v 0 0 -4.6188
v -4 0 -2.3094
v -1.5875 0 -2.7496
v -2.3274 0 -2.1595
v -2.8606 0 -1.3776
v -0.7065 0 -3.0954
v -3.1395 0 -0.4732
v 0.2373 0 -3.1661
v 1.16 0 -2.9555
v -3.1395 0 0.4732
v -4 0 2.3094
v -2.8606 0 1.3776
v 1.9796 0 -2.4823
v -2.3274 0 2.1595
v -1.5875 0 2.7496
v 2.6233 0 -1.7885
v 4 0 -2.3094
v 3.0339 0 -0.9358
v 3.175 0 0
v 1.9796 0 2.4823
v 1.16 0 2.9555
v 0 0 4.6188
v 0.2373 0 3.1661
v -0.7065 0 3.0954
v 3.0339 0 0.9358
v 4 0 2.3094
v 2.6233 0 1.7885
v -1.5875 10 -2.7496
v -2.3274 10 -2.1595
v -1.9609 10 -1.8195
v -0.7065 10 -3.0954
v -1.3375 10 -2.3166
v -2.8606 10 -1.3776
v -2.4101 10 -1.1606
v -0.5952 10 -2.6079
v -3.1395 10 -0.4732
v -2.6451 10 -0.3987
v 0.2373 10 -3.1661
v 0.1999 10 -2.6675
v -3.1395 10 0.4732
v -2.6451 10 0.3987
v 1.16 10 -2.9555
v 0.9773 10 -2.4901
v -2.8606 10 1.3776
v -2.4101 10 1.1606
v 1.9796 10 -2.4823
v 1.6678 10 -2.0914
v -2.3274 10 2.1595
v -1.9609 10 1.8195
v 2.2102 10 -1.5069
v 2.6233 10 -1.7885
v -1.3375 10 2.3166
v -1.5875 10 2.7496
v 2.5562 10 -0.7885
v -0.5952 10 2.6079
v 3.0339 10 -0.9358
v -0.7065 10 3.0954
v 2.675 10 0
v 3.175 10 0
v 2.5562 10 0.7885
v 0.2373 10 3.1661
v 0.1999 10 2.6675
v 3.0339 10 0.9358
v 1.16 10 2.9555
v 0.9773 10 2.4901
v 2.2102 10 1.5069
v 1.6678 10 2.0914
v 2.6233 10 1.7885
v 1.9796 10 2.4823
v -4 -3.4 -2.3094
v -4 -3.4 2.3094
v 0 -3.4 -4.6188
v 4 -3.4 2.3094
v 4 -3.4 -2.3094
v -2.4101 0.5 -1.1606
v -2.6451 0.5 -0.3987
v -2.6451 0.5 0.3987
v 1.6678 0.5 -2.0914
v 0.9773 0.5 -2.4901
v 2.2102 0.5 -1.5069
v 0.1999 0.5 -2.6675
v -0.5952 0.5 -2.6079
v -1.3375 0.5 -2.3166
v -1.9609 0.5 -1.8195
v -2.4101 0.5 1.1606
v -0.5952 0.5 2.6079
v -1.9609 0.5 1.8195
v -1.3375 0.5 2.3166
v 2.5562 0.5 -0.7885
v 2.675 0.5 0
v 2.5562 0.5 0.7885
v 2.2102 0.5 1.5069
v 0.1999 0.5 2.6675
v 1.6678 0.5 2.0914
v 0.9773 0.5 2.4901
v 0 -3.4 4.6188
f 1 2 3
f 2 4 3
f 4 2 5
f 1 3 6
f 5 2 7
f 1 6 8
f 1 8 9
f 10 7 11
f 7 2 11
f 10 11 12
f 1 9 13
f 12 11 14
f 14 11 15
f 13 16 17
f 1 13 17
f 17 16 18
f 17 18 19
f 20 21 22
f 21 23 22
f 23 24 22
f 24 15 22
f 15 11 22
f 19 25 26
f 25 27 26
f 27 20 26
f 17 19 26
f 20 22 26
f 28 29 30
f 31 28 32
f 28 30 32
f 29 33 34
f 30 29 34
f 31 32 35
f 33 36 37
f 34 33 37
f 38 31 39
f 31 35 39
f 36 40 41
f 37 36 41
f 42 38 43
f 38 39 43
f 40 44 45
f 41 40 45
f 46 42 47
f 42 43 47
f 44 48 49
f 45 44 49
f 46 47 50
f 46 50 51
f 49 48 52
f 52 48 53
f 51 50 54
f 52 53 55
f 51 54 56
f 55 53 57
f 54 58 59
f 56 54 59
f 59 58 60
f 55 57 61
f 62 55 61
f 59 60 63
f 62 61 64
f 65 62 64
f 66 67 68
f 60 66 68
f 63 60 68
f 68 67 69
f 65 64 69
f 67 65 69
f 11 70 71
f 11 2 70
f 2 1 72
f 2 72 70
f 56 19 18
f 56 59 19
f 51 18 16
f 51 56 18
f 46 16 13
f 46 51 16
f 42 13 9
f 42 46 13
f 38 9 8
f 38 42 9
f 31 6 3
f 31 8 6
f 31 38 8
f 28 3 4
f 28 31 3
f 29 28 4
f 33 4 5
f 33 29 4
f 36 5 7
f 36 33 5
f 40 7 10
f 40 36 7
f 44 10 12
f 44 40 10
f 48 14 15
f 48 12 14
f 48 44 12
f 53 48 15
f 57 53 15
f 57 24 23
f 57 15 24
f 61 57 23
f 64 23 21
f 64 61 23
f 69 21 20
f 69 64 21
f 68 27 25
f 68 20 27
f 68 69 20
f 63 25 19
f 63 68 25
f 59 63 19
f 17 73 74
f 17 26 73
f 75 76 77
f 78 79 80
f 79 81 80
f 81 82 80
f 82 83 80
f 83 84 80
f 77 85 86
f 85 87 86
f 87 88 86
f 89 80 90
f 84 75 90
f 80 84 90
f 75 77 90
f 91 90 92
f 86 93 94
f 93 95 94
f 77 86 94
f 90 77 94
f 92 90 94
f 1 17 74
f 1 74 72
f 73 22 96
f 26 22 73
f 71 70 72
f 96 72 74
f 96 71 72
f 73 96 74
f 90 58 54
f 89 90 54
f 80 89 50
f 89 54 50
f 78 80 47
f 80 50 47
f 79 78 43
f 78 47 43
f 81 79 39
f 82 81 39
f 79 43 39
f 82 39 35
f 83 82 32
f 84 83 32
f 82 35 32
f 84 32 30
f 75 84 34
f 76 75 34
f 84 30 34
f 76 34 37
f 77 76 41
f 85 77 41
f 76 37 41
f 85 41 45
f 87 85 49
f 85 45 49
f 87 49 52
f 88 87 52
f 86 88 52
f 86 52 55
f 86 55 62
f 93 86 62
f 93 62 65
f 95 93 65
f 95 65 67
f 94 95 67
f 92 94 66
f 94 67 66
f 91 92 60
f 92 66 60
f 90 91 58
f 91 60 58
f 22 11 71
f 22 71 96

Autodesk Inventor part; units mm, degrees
ref_plane "YZ Plane" through (0, 0, 0) normal (1, 0, 0) x (0, 1, 0)
ref_plane "XZ Plane" through (0, 0, 0) normal (0, 1, 0) x (-1, 0, 0)
ref_plane "XY Plane" through (0, 0, 0) normal (0, 0, 1) x (1, 0, 0)
sketch "Sketch1" plane through (0, 0, 0) normal (0, 0, 1) x (1, 0, 0)
  line L0 (0, 0) -> (3.175, 0)
  line L1 (3.175, 0) -> (3.175, 10)
  line L2 (3.175, 10) -> (0, 10)
  line L3 (0, 10) -> (0, 0)
  dimension "d0" = 3.175
  dimension "d1" = 10
revolve "Revolution1" add sketch "Sketch1" angle 360 about axis through (0, 10, 0) along (0, -1, 0)
shell "Shell1" thickness 0.5 removed faces 1 at (0.8826, 10, -0.0433)
thread "Thread1" size "1/4-36 UNS" class "2A" standard "ANSI Unified Screw Threads" full length
sketch "Sketch2" plane through (0, 0, 0) normal (0, -1, 0) x (1, 0, 0)
  line L0 (0, 4.6188) -> (4, 2.3094)
  line L1 (4, 2.3094) -> (4, -2.3094)
  line L2 (4, -2.3094) -> (0, -4.6188)
  line L3 (0, -4.6188) -> (-4, -2.3094)
  line L4 (-4, -2.3094) -> (-4, 2.3094)
  line L5 (-4, 2.3094) -> (0, 4.6188)
  point P0 (0, 0)
  point P1 (0, 0)
  dimension "d6" = 8
extrude "Extrusion1" add sketch "Sketch2" along normal blind 3.4
properties part number "W9011M COAXIAL CONNECTOR"
